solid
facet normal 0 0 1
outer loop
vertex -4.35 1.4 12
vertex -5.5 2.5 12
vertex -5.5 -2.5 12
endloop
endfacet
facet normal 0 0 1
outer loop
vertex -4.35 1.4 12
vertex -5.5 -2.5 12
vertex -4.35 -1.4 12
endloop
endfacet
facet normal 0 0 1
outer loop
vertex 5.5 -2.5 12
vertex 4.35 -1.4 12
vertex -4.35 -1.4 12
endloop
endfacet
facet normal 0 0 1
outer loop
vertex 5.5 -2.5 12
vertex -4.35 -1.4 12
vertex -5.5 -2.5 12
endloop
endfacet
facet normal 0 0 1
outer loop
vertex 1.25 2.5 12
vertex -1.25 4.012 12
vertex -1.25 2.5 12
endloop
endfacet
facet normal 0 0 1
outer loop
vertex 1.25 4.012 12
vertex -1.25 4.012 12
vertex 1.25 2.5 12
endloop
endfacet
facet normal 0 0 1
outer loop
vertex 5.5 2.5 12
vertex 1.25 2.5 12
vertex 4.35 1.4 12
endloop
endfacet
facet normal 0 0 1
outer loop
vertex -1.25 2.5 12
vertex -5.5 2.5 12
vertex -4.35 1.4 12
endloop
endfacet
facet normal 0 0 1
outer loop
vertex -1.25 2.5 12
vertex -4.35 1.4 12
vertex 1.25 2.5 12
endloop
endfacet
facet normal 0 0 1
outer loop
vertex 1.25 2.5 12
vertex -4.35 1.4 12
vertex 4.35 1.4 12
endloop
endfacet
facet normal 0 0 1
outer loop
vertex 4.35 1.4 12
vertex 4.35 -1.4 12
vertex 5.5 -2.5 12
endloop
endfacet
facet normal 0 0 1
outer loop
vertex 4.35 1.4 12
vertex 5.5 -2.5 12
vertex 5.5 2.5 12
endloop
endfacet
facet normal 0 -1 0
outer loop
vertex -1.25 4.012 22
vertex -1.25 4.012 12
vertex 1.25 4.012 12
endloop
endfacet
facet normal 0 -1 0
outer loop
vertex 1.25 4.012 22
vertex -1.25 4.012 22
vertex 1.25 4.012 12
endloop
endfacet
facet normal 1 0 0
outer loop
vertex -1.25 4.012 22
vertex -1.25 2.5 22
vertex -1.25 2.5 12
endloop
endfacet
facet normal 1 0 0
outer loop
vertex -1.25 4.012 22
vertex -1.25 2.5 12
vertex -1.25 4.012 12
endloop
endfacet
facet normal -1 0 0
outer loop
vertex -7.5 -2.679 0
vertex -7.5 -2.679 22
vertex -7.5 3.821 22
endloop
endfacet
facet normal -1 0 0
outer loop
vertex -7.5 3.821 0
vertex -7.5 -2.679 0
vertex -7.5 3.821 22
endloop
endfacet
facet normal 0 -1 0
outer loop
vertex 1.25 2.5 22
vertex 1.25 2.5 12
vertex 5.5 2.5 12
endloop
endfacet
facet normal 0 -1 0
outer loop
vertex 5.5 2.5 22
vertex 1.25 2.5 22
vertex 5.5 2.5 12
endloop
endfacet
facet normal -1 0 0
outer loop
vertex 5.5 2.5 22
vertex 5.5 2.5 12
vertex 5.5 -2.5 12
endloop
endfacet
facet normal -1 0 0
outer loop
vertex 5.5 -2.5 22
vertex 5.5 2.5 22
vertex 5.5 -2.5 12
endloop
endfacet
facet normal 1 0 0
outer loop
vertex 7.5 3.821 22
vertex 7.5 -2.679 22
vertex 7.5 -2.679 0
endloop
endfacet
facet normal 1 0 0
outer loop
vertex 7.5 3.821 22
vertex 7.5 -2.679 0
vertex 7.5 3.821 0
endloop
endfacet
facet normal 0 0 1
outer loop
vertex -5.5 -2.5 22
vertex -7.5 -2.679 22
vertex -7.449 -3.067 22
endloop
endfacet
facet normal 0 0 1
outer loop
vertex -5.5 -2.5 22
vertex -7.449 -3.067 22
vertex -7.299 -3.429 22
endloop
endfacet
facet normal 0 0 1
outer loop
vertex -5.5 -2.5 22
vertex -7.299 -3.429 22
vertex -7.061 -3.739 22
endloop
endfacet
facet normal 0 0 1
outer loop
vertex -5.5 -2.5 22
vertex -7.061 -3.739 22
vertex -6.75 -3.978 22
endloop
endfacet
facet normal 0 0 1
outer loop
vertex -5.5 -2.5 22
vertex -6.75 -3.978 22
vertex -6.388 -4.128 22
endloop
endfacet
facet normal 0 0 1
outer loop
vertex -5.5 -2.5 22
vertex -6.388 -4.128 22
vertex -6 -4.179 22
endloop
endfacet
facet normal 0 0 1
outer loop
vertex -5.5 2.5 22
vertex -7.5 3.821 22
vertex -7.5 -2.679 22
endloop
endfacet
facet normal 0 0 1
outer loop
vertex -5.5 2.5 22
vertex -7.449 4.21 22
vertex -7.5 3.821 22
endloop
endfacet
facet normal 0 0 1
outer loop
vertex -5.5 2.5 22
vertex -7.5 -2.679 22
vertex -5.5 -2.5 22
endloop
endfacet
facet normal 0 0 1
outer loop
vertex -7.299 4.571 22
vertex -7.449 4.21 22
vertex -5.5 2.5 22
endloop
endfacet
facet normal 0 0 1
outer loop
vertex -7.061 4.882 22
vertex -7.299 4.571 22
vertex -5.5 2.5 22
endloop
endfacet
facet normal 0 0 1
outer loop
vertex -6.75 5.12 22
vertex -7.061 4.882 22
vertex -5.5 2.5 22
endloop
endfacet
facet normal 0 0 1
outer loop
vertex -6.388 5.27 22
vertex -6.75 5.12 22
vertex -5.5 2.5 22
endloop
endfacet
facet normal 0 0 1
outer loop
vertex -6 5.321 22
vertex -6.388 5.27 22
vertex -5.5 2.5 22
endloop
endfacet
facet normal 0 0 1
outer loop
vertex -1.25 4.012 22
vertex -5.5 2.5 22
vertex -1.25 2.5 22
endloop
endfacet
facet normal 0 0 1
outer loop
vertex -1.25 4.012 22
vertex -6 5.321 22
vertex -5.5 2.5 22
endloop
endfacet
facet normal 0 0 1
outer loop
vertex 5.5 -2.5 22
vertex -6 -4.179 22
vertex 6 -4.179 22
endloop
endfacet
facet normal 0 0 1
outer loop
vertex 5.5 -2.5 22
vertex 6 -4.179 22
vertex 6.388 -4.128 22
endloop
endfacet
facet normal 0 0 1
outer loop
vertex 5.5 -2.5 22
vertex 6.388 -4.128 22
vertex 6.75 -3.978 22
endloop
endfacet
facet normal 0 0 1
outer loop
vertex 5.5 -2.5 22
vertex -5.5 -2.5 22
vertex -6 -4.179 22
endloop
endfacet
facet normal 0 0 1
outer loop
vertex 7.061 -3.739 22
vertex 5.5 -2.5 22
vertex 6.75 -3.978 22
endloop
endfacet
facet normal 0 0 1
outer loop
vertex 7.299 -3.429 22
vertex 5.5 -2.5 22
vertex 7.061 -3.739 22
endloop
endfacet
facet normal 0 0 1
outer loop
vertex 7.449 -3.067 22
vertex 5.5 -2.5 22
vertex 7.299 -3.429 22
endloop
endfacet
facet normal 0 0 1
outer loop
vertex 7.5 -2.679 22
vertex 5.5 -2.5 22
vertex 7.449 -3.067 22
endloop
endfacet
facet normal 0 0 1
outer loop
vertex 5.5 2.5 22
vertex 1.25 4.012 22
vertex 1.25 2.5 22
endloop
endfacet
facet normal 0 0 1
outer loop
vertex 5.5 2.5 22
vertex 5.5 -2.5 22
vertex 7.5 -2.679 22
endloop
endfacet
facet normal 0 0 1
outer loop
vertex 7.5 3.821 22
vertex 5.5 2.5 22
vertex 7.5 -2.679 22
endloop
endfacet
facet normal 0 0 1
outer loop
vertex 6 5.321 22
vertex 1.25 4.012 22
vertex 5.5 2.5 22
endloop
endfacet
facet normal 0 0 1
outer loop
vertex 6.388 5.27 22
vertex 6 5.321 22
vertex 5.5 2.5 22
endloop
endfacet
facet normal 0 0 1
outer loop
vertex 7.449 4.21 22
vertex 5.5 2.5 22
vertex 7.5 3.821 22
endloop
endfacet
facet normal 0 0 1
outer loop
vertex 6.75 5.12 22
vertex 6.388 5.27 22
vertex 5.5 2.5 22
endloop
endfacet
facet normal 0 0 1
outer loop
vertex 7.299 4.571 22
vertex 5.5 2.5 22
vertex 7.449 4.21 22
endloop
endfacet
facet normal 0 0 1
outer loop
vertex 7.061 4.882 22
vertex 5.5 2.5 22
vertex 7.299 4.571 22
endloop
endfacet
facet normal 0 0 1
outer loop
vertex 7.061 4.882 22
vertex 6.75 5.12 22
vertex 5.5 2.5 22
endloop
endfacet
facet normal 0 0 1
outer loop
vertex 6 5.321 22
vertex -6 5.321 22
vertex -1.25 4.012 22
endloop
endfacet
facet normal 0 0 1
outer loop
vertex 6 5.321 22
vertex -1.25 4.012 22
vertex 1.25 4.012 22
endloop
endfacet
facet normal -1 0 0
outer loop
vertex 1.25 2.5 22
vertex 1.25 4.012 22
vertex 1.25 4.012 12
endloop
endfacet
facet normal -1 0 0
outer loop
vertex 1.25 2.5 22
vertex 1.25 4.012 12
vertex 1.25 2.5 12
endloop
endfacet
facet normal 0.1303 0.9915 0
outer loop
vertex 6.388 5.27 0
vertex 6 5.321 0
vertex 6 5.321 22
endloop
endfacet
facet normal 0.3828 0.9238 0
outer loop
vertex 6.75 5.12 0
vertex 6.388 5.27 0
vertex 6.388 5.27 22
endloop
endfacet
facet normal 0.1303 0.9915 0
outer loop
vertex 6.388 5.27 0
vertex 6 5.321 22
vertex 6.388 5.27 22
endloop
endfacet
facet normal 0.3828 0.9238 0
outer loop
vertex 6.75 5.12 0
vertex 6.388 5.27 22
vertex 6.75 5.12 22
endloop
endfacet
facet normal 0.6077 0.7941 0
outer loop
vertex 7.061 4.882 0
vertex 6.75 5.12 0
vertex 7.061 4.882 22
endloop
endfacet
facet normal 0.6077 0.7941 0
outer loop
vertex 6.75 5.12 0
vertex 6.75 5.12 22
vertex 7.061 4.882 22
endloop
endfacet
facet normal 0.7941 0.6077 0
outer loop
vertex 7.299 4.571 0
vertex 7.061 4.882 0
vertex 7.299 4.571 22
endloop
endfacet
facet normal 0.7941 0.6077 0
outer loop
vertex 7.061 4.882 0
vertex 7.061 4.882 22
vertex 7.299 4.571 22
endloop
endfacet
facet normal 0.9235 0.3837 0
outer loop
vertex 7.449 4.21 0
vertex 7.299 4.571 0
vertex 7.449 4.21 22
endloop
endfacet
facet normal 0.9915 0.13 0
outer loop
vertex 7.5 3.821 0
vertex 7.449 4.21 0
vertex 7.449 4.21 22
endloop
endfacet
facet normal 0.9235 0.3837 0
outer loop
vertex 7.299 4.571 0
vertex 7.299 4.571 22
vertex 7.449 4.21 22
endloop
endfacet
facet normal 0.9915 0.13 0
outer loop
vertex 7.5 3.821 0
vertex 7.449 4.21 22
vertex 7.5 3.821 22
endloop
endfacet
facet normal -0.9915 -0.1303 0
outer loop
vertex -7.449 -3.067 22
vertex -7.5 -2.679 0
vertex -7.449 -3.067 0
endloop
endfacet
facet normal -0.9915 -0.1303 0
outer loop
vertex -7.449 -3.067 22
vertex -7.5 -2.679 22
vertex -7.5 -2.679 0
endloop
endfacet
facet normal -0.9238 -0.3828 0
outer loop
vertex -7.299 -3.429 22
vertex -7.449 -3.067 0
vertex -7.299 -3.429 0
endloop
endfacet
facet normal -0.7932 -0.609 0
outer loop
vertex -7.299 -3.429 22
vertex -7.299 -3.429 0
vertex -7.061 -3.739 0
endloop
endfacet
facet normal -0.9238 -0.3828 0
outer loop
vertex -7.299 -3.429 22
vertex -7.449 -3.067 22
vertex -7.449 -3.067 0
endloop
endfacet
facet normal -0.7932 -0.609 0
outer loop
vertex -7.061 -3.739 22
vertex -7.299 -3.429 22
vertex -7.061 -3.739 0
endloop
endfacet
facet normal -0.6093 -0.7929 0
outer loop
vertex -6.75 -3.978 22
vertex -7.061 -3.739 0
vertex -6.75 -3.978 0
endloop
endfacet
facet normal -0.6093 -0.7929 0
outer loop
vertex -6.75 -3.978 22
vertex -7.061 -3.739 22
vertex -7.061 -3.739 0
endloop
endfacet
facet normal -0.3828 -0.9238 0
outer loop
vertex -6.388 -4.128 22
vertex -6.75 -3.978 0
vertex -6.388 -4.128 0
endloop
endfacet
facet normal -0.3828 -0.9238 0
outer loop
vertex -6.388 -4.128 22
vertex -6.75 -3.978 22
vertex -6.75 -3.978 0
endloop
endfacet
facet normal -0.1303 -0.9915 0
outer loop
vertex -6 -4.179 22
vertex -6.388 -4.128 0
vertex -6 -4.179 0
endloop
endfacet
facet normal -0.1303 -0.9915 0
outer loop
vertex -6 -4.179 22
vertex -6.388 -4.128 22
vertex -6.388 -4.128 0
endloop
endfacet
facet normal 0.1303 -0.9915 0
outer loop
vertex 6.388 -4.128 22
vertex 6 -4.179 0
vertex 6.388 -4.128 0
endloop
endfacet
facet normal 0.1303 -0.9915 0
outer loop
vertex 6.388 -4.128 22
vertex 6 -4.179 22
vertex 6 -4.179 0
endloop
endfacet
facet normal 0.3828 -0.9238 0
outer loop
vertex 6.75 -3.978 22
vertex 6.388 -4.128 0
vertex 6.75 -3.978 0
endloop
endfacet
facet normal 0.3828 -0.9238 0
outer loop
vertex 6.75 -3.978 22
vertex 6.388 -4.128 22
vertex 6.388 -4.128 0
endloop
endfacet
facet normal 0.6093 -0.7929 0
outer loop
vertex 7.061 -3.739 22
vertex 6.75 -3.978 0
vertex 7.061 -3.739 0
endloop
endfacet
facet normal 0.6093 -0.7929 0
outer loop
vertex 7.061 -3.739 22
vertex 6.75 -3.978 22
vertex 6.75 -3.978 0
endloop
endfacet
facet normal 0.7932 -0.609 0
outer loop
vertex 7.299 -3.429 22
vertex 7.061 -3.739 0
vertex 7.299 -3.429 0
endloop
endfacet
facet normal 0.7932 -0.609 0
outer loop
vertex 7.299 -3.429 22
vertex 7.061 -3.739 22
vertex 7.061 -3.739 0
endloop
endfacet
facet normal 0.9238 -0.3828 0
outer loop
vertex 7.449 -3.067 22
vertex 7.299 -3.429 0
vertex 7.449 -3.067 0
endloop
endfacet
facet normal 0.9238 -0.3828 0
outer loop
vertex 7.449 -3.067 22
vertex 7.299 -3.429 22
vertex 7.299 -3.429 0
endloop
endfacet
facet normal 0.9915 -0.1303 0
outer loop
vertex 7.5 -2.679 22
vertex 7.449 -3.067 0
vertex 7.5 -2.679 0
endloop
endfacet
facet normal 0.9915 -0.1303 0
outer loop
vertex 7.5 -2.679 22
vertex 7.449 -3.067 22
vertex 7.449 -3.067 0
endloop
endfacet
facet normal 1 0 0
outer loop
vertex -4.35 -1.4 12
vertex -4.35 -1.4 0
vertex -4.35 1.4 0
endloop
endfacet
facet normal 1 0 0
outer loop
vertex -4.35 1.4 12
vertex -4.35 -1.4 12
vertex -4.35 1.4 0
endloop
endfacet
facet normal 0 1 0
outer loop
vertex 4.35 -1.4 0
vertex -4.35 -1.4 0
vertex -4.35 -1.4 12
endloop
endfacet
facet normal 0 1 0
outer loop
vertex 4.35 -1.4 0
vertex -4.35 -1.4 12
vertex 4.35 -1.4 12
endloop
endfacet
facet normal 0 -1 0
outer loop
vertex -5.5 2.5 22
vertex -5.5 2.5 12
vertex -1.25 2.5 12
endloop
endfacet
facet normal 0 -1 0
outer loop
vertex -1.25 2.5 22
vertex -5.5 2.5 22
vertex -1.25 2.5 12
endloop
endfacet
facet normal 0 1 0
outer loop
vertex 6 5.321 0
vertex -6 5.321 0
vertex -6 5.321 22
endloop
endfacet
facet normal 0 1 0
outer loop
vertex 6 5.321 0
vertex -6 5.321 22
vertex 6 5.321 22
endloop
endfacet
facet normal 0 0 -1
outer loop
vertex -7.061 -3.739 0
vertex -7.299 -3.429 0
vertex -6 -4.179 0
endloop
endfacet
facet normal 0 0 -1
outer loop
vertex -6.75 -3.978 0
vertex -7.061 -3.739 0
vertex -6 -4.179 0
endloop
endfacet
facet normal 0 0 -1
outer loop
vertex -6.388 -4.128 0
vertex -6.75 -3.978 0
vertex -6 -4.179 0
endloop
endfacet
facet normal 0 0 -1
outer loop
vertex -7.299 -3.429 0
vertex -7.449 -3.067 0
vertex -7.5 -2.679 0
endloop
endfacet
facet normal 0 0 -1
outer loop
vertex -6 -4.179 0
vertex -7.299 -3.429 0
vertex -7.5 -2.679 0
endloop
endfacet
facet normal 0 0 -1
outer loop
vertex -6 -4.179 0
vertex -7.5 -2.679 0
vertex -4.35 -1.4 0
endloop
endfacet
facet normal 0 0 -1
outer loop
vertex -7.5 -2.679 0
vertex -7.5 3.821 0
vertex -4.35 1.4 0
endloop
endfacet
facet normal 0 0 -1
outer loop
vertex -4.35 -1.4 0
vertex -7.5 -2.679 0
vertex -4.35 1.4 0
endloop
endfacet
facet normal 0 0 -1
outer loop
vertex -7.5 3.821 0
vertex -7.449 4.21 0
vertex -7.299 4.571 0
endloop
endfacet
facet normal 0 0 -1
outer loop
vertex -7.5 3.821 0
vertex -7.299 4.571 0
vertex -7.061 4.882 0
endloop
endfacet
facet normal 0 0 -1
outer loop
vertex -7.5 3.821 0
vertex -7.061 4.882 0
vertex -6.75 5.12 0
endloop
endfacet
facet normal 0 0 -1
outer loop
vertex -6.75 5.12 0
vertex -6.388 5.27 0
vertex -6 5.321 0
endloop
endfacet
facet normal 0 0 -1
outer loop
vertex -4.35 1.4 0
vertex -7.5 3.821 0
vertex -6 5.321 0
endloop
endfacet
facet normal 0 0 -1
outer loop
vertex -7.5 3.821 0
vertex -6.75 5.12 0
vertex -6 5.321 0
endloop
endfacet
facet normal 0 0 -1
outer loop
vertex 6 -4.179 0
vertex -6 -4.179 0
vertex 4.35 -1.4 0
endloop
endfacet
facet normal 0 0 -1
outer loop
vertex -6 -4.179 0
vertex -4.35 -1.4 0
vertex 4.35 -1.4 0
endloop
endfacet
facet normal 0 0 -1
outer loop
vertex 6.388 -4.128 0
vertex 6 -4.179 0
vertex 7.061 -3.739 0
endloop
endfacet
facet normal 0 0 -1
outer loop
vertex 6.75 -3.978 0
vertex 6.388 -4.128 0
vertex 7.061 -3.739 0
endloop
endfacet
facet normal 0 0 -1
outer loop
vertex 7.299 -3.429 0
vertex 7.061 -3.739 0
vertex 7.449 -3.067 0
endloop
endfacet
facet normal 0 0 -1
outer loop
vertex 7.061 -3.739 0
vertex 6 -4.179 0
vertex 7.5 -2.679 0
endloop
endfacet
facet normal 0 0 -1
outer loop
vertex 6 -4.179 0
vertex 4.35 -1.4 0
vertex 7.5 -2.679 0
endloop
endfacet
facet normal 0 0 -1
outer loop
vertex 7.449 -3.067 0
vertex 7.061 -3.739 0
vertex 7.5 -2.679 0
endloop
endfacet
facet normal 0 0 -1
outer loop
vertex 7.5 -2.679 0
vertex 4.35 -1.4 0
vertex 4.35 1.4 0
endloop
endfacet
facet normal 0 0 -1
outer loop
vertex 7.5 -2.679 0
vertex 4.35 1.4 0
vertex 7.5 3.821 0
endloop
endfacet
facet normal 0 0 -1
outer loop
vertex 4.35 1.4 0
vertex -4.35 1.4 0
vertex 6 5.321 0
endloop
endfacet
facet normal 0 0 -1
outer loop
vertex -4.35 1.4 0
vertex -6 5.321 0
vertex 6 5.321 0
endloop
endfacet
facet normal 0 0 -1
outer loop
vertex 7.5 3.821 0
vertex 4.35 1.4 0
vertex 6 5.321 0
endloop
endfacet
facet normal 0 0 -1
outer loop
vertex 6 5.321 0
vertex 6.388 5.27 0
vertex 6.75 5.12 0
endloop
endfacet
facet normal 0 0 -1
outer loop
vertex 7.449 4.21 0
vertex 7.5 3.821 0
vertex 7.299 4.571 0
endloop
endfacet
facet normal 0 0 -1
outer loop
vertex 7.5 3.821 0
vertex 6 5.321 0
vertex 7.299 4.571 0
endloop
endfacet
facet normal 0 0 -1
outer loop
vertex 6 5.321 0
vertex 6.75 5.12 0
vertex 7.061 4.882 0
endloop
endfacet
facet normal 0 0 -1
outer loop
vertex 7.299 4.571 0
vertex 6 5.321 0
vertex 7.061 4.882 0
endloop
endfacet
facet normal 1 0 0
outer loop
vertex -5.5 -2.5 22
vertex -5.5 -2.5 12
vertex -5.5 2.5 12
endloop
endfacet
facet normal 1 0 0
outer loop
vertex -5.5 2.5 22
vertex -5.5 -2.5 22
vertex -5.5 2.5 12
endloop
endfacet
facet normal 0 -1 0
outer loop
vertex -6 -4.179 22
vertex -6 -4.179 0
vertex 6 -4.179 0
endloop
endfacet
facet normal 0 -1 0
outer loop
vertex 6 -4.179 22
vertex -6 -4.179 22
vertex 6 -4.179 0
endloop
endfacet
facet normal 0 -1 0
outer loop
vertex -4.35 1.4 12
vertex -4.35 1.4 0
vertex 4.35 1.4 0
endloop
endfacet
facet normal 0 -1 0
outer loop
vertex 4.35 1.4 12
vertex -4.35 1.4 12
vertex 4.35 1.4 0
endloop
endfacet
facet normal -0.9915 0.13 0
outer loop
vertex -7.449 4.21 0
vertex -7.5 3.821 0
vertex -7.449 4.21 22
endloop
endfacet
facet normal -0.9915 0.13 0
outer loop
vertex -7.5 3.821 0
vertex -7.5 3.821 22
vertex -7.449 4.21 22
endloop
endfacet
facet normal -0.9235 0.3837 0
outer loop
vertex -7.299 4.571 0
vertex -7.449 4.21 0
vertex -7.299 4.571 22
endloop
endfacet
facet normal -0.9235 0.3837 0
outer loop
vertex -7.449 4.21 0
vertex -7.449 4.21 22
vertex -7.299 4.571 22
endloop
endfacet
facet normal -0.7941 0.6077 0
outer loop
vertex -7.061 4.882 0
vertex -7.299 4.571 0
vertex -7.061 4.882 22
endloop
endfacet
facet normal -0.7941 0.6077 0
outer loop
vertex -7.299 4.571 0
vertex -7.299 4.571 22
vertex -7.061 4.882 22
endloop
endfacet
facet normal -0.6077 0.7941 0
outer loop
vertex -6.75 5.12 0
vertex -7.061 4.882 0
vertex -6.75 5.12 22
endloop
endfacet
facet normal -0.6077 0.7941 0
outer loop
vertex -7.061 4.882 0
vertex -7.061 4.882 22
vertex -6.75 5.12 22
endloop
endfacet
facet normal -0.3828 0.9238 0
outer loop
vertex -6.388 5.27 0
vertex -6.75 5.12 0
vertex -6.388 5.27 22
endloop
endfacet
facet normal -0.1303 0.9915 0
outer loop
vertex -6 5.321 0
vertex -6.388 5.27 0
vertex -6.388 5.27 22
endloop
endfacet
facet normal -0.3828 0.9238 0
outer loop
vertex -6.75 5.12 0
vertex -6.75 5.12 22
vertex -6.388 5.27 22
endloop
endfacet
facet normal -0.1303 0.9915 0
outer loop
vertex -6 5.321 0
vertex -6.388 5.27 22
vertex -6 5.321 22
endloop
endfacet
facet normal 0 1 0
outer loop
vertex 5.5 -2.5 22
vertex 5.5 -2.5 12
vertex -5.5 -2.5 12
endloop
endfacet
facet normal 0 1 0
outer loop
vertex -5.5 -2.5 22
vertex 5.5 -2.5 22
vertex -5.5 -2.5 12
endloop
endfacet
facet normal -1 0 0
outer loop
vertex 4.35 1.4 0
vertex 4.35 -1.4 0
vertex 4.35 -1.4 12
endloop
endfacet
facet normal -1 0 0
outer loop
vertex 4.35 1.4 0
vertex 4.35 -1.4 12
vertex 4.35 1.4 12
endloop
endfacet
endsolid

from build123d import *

# Parameters (mm, degrees)
F0_W     = 15
F0_H     = 9.5
F1_DEPTH = 22
F0_W_2   = 8.7
F0_H_2   = 2.8
F2_DEPTH = 12
F3_R     = 1.5


with BuildPart() as f1:
    # F0 (on Top) → F1 (new body)
    with BuildSketch(Plane.XY):
        with Locations((0, 0.571325)):
            Rectangle(F0_W, F0_H)
        Polygon((5.5, 2.5), (5.5, -2.5), (-5.5, -2.5), (-5.5, 2.5), (-1.25, 2.5), (-1.25, 4.012365), (1.25, 4.012365), (1.25, 2.5), align=None, mode=Mode.SUBTRACT)
    extrude(amount=F1_DEPTH)

    # F0 (on Top) → F2 (join)
    with BuildSketch(Plane.XY):
        Polygon((-5.5, -2.5), (5.5, -2.5), (5.5, 2.5), (1.25, 2.5), (1.25, 4.012365), (-1.25, 4.012365), (-1.25, 2.5), (-5.5, 2.5), align=None)
        Rectangle(F0_W_2, F0_H_2, mode=Mode.SUBTRACT)
    extrude(amount=F2_DEPTH)

    # F3
    f3_edges = [f1.edges().sort_by_distance(p)[0] for p in [
        (-7.5, 5.321325, 11),
        (7.5, 5.321325, 11),
        (7.5, -4.178675, 11),
        (-7.5, -4.178675, 11),
    ]]
    fillet(f3_edges, radius=F3_R)


solid = f1.part
